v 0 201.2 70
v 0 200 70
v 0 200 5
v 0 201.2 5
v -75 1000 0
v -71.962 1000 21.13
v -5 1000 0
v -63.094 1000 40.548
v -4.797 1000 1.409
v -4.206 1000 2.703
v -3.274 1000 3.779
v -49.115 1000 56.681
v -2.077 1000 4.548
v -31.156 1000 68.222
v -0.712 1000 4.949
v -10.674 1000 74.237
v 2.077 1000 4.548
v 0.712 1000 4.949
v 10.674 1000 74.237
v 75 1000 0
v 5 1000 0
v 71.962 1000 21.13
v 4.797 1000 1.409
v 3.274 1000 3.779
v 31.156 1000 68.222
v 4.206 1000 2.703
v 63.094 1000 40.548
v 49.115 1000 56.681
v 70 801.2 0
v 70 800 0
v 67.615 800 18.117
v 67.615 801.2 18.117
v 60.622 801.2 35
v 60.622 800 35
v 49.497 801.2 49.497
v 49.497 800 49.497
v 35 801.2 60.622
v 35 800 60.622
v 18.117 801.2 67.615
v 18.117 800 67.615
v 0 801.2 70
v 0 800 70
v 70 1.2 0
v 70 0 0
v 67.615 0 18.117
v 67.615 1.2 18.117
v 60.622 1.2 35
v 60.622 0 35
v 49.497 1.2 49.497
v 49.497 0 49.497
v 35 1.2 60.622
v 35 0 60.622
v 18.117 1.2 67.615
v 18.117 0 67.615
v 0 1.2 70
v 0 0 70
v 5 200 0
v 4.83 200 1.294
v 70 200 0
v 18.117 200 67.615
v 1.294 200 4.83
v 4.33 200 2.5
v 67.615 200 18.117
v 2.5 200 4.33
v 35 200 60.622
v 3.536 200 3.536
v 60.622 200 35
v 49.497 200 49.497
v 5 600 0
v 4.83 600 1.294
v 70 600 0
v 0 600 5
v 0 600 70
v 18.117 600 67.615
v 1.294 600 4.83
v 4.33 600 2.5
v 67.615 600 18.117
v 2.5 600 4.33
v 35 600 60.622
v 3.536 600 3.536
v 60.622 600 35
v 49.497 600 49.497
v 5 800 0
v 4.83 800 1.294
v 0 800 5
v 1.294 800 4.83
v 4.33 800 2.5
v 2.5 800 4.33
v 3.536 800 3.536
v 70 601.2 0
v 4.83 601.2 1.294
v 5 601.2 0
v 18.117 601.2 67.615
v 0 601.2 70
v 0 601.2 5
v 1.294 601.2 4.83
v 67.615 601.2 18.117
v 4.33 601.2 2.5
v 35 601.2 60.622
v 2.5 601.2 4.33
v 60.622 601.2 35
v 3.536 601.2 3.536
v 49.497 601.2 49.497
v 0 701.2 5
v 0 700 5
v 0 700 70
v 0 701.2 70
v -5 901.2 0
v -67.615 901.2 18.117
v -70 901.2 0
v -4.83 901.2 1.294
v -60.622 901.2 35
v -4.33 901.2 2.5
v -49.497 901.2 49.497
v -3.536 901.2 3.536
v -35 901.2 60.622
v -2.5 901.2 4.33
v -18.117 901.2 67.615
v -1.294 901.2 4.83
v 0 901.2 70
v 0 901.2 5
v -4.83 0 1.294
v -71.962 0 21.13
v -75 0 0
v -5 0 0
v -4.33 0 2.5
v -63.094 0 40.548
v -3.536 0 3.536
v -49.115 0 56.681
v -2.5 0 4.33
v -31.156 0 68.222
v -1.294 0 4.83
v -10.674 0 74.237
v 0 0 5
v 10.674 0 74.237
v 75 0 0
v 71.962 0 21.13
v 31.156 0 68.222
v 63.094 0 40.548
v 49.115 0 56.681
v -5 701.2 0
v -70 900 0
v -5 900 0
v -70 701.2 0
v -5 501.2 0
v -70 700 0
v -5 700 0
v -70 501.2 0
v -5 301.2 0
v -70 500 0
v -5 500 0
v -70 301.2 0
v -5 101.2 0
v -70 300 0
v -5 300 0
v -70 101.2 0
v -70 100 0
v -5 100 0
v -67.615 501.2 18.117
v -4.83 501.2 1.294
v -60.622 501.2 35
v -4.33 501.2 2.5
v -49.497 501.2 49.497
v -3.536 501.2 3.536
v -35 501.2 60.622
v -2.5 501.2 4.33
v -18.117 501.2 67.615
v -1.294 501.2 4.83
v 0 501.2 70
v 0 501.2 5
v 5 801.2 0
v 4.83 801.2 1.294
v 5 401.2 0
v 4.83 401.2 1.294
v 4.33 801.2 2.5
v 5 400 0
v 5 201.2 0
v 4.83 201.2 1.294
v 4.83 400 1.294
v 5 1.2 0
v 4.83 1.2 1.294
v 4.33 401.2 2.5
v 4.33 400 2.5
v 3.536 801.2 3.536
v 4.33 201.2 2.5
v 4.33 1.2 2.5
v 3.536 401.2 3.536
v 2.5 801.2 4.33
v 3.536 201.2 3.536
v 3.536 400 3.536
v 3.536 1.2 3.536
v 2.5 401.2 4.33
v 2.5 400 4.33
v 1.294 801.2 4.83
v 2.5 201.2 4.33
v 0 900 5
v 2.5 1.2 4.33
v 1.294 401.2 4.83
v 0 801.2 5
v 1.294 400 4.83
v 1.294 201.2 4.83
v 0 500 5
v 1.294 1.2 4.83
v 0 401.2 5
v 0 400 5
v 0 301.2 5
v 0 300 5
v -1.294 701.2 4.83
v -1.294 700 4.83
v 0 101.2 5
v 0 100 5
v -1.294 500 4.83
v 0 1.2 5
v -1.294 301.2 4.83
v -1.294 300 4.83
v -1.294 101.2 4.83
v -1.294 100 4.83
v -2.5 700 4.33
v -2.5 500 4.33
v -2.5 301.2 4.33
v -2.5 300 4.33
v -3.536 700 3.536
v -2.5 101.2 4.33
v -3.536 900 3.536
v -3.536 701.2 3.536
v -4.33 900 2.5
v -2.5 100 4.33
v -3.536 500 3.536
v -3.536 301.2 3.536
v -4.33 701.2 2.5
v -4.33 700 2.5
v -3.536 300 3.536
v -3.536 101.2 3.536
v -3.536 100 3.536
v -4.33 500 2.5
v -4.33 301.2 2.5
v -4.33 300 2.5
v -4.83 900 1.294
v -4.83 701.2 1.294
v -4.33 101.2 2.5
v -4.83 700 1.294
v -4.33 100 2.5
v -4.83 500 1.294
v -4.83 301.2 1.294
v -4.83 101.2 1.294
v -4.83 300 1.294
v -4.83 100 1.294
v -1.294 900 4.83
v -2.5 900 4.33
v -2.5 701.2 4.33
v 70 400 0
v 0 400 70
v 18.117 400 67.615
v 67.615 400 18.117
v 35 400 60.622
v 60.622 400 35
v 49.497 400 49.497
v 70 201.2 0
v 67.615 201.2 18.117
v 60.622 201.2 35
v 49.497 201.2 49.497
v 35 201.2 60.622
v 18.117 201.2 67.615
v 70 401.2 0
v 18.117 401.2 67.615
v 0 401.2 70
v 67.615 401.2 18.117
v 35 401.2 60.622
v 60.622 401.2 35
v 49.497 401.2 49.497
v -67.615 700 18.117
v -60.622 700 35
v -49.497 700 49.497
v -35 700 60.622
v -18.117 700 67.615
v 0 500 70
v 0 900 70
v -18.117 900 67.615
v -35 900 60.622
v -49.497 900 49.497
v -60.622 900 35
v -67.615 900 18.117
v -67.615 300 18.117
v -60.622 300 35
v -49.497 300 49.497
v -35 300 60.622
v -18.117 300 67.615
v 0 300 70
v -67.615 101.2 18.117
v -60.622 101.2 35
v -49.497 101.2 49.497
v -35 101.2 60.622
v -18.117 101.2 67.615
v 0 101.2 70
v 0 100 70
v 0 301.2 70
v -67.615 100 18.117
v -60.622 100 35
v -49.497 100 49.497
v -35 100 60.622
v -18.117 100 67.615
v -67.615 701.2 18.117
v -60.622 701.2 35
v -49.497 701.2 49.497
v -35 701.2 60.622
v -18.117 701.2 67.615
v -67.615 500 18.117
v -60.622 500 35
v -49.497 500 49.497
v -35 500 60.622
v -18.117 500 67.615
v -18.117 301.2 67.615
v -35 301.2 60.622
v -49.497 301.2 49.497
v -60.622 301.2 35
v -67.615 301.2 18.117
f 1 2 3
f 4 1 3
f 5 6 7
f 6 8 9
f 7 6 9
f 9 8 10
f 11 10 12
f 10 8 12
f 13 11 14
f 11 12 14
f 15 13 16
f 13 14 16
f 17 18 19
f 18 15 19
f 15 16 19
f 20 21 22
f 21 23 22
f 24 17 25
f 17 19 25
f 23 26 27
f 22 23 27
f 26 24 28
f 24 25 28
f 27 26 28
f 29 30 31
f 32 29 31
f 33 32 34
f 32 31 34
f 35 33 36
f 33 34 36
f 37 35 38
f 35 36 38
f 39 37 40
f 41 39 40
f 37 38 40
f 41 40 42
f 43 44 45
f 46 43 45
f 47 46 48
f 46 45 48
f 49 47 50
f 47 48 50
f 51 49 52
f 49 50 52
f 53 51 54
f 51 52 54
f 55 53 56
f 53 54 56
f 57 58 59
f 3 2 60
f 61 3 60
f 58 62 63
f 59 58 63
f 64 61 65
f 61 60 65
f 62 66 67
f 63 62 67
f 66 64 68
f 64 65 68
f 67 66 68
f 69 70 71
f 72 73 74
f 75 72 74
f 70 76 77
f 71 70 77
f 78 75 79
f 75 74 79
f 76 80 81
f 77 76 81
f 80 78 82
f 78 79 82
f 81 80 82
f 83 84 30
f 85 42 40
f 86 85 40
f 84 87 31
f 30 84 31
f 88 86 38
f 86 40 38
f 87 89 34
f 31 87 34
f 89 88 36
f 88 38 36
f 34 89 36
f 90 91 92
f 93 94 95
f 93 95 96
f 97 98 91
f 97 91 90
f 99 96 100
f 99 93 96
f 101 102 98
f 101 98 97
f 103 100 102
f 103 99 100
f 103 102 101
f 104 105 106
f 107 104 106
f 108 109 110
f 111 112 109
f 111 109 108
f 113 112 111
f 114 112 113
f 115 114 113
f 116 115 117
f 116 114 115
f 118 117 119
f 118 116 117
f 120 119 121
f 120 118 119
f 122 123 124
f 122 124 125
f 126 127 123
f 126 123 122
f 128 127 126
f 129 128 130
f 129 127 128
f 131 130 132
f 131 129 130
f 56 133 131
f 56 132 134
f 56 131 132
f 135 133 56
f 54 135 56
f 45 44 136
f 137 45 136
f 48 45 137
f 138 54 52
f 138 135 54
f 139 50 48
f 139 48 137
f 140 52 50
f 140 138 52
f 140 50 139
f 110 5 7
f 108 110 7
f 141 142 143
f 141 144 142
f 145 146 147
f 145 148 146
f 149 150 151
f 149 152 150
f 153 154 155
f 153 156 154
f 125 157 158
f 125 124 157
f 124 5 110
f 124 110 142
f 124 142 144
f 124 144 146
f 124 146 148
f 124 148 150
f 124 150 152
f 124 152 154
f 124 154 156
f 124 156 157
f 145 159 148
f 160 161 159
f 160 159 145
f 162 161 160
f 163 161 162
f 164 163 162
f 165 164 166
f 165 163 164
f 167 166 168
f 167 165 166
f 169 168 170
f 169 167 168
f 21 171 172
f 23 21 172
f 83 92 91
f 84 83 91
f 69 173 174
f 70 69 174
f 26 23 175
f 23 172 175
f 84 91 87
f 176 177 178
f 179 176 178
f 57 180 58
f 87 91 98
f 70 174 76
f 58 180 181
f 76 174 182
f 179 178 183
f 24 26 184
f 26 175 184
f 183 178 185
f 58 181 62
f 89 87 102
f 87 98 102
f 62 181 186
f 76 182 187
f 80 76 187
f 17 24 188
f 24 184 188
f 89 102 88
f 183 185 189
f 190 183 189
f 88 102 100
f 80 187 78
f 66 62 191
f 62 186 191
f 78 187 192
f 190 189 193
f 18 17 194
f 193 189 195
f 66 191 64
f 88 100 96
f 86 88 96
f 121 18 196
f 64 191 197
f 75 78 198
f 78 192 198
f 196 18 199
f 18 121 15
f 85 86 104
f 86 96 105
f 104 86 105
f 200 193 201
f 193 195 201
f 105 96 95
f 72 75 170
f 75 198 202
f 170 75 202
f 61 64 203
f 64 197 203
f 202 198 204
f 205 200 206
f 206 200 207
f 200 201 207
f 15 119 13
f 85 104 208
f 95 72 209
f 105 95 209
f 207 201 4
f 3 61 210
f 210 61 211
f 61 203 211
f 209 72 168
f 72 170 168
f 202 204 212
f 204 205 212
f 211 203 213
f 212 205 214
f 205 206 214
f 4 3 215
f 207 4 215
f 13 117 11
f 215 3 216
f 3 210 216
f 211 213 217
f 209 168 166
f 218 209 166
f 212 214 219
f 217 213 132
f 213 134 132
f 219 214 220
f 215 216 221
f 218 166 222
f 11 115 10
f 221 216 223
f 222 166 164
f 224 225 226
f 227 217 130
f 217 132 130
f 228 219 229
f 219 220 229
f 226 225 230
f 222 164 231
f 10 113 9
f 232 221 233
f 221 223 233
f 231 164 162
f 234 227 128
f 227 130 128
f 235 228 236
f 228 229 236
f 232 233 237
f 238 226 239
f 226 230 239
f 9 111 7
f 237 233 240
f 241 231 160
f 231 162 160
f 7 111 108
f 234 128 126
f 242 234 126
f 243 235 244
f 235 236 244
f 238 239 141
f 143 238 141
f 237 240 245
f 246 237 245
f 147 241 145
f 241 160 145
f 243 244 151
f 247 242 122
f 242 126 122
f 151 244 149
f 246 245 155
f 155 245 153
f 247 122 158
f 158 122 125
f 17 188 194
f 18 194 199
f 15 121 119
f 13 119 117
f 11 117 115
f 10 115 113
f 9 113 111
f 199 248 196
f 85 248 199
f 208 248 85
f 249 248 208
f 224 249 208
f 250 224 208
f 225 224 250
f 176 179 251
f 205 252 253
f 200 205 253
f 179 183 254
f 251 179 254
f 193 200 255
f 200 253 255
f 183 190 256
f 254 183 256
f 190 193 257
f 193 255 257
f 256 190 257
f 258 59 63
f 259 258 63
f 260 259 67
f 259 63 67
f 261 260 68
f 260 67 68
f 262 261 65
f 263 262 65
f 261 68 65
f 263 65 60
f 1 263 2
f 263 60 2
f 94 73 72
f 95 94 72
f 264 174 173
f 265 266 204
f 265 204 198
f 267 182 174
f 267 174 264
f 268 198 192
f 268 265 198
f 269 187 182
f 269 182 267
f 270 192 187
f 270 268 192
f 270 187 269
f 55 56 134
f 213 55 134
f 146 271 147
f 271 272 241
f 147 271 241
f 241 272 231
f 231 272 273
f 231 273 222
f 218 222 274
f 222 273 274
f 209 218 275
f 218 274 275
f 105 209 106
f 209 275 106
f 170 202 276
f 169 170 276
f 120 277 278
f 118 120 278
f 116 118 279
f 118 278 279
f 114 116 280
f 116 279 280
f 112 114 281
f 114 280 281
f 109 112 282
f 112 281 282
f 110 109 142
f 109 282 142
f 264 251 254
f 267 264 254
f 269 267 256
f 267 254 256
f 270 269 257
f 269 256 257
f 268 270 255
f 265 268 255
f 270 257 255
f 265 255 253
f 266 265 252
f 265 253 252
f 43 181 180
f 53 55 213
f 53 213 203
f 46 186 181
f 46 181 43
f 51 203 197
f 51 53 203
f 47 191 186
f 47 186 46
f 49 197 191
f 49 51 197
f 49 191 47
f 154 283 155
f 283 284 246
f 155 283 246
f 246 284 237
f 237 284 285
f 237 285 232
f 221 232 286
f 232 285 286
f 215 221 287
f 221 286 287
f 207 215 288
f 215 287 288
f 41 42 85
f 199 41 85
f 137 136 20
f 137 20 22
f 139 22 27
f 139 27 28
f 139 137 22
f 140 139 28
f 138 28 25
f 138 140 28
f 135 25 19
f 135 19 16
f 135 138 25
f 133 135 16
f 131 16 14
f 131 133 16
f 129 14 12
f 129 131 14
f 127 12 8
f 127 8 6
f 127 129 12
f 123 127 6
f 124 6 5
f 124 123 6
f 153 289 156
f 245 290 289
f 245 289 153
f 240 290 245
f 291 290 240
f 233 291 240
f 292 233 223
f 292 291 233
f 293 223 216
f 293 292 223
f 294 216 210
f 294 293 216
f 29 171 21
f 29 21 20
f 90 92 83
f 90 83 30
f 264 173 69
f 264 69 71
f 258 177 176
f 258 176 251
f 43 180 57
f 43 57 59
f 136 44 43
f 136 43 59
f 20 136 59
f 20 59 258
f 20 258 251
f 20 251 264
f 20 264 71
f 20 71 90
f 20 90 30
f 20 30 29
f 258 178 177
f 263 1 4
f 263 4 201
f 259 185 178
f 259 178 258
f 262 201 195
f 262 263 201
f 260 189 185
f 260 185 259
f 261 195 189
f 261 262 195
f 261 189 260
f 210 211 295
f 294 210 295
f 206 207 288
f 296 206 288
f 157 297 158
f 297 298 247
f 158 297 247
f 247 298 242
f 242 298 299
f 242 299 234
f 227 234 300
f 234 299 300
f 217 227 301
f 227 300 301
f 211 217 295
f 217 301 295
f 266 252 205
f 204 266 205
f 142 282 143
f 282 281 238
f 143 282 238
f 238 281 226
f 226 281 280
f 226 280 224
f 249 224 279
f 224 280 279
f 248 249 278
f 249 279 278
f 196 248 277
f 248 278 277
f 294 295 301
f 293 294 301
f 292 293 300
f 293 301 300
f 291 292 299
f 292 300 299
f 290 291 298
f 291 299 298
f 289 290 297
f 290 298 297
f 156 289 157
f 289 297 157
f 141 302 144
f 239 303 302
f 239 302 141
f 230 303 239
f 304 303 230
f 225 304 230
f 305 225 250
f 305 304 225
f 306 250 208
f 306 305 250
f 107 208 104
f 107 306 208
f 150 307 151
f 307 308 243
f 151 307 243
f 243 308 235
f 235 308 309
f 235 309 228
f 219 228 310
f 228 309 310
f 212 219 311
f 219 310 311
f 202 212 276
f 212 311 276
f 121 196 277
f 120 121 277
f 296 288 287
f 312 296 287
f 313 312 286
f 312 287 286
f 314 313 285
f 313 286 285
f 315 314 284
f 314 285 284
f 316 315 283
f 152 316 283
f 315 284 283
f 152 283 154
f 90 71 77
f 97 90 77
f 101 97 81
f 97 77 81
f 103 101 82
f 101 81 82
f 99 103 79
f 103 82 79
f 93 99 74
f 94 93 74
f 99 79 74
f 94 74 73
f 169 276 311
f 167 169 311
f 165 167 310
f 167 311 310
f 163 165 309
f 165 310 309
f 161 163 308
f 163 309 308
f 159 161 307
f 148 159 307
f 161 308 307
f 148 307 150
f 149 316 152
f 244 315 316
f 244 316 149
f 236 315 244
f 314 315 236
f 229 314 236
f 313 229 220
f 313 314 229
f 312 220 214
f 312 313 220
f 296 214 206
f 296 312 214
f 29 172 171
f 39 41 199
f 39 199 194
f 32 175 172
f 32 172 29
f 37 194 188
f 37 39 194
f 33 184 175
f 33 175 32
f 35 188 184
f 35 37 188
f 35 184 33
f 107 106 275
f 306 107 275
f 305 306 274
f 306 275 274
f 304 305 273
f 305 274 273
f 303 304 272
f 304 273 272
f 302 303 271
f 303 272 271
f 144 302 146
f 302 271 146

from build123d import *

# Parameters (mm, degrees)
F0_R      = 75
F1_DEPTH  = 1000
F2_R      = 5
F3_DEPTH  = 1000
F5_DEPTH  = 1.2
F8_DEPTH  = 1.2
F26_DEPTH = 1.2
F27_DEPTH = 1.2
F28_DEPTH = 1.2
F29_DEPTH = 1.2
F30_DEPTH = 1.2
F31_DEPTH = 1.2
F32_DEPTH = 1.2
F33_DEPTH = 1.2
F34_W     = 218.629919
F34_H     = 81.904643
F35_DEPTH = 1000


with BuildPart() as f1:
    # F0 (on Front) → F1 (new body)
    with BuildSketch(Plane.XZ):
        Circle(F0_R)
    extrude(amount=-F1_DEPTH)

    # F2 (on Front) → F3 (cut)
    with BuildSketch(Plane.XZ):
        Circle(F2_R)
    extrude(amount=-F3_DEPTH, mode=Mode.SUBTRACT)

    # F4 (on Front) → F5 (cut)
    with BuildSketch(Plane.XZ):
        with BuildLine():
            Line((0, 70), (0, -70))
            ThreePointArc((0, -70), (70, 0), (0, 70))
        make_face()
    extrude(amount=-F5_DEPTH, mode=Mode.SUBTRACT)

    # F7 (on offset) → F8 (cut)
    with BuildSketch(Plane.XZ.offset(-100)):
        with BuildLine():
            Line((0, -70), (0, 70))
            ThreePointArc((0, 70), (-70, 0), (0, -70))
        make_face()
    extrude(amount=-F8_DEPTH, mode=Mode.SUBTRACT)

    # F18 (on offset) → F26 (cut)
    with BuildSketch(Plane.XZ.offset(-200)):
        with BuildLine():
            Line((0, 70), (0, -70))
            ThreePointArc((0, -70), (70, 0), (0, 70))
        make_face()
    extrude(amount=-F26_DEPTH, mode=Mode.SUBTRACT)

    # F19 (on offset) → F27 (cut)
    with BuildSketch(Plane.XZ.offset(-300)):
        with BuildLine():
            Line((0, -70), (0, 70))
            ThreePointArc((0, 70), (-70, 0), (0, -70))
        make_face()
    extrude(amount=-F27_DEPTH, mode=Mode.SUBTRACT)

    # F20 (on offset) → F28 (cut)
    with BuildSketch(Plane.XZ.offset(-400)):
        with BuildLine():
            Line((0, 70), (0, -70))
            ThreePointArc((0, -70), (70, 0), (0, 70))
        make_face()
    extrude(amount=-F28_DEPTH, mode=Mode.SUBTRACT)

    # F21 (on offset) → F29 (cut)
    with BuildSketch(Plane.XZ.offset(-500)):
        with BuildLine():
            Line((0, -70), (0, 70))
            ThreePointArc((0, 70), (-70, 0), (0, -70))
        make_face()
    extrude(amount=-F29_DEPTH, mode=Mode.SUBTRACT)

    # F22 (on offset) → F30 (cut)
    with BuildSketch(Plane.XZ.offset(-600)):
        with BuildLine():
            Line((0, 70), (0, -70))
            ThreePointArc((0, -70), (70, 0), (0, 70))
        make_face()
    extrude(amount=-F30_DEPTH, mode=Mode.SUBTRACT)

    # F23 (on offset) → F31 (cut)
    with BuildSketch(Plane.XZ.offset(-700)):
        with BuildLine():
            Line((0, -70), (0, 70))
            ThreePointArc((0, 70), (-70, 0), (0, -70))
        make_face()
    extrude(amount=-F31_DEPTH, mode=Mode.SUBTRACT)

    # F24 (on offset) → F32 (cut)
    with BuildSketch(Plane.XZ.offset(-800)):
        with BuildLine():
            Line((0, 70), (0, -70))
            ThreePointArc((0, -70), (70, 0), (0, 70))
        make_face()
    extrude(amount=-F32_DEPTH, mode=Mode.SUBTRACT)

    # F25 (on offset) → F33 (cut)
    with BuildSketch(Plane.XZ.offset(-900)):
        with BuildLine():
            Line((0, -70), (0, 70))
            ThreePointArc((0, 70), (-70, 0), (0, -70))
        make_face()
    extrude(amount=-F33_DEPTH, mode=Mode.SUBTRACT)

    # F34 (on Front) → F35 (cut)
    with BuildSketch(Plane.XZ):
        with Locations((-1.260769, -40.952321)):
            Rectangle(F34_W, F34_H)
    extrude(amount=-F35_DEPTH, mode=Mode.SUBTRACT)


solid = f1.part
